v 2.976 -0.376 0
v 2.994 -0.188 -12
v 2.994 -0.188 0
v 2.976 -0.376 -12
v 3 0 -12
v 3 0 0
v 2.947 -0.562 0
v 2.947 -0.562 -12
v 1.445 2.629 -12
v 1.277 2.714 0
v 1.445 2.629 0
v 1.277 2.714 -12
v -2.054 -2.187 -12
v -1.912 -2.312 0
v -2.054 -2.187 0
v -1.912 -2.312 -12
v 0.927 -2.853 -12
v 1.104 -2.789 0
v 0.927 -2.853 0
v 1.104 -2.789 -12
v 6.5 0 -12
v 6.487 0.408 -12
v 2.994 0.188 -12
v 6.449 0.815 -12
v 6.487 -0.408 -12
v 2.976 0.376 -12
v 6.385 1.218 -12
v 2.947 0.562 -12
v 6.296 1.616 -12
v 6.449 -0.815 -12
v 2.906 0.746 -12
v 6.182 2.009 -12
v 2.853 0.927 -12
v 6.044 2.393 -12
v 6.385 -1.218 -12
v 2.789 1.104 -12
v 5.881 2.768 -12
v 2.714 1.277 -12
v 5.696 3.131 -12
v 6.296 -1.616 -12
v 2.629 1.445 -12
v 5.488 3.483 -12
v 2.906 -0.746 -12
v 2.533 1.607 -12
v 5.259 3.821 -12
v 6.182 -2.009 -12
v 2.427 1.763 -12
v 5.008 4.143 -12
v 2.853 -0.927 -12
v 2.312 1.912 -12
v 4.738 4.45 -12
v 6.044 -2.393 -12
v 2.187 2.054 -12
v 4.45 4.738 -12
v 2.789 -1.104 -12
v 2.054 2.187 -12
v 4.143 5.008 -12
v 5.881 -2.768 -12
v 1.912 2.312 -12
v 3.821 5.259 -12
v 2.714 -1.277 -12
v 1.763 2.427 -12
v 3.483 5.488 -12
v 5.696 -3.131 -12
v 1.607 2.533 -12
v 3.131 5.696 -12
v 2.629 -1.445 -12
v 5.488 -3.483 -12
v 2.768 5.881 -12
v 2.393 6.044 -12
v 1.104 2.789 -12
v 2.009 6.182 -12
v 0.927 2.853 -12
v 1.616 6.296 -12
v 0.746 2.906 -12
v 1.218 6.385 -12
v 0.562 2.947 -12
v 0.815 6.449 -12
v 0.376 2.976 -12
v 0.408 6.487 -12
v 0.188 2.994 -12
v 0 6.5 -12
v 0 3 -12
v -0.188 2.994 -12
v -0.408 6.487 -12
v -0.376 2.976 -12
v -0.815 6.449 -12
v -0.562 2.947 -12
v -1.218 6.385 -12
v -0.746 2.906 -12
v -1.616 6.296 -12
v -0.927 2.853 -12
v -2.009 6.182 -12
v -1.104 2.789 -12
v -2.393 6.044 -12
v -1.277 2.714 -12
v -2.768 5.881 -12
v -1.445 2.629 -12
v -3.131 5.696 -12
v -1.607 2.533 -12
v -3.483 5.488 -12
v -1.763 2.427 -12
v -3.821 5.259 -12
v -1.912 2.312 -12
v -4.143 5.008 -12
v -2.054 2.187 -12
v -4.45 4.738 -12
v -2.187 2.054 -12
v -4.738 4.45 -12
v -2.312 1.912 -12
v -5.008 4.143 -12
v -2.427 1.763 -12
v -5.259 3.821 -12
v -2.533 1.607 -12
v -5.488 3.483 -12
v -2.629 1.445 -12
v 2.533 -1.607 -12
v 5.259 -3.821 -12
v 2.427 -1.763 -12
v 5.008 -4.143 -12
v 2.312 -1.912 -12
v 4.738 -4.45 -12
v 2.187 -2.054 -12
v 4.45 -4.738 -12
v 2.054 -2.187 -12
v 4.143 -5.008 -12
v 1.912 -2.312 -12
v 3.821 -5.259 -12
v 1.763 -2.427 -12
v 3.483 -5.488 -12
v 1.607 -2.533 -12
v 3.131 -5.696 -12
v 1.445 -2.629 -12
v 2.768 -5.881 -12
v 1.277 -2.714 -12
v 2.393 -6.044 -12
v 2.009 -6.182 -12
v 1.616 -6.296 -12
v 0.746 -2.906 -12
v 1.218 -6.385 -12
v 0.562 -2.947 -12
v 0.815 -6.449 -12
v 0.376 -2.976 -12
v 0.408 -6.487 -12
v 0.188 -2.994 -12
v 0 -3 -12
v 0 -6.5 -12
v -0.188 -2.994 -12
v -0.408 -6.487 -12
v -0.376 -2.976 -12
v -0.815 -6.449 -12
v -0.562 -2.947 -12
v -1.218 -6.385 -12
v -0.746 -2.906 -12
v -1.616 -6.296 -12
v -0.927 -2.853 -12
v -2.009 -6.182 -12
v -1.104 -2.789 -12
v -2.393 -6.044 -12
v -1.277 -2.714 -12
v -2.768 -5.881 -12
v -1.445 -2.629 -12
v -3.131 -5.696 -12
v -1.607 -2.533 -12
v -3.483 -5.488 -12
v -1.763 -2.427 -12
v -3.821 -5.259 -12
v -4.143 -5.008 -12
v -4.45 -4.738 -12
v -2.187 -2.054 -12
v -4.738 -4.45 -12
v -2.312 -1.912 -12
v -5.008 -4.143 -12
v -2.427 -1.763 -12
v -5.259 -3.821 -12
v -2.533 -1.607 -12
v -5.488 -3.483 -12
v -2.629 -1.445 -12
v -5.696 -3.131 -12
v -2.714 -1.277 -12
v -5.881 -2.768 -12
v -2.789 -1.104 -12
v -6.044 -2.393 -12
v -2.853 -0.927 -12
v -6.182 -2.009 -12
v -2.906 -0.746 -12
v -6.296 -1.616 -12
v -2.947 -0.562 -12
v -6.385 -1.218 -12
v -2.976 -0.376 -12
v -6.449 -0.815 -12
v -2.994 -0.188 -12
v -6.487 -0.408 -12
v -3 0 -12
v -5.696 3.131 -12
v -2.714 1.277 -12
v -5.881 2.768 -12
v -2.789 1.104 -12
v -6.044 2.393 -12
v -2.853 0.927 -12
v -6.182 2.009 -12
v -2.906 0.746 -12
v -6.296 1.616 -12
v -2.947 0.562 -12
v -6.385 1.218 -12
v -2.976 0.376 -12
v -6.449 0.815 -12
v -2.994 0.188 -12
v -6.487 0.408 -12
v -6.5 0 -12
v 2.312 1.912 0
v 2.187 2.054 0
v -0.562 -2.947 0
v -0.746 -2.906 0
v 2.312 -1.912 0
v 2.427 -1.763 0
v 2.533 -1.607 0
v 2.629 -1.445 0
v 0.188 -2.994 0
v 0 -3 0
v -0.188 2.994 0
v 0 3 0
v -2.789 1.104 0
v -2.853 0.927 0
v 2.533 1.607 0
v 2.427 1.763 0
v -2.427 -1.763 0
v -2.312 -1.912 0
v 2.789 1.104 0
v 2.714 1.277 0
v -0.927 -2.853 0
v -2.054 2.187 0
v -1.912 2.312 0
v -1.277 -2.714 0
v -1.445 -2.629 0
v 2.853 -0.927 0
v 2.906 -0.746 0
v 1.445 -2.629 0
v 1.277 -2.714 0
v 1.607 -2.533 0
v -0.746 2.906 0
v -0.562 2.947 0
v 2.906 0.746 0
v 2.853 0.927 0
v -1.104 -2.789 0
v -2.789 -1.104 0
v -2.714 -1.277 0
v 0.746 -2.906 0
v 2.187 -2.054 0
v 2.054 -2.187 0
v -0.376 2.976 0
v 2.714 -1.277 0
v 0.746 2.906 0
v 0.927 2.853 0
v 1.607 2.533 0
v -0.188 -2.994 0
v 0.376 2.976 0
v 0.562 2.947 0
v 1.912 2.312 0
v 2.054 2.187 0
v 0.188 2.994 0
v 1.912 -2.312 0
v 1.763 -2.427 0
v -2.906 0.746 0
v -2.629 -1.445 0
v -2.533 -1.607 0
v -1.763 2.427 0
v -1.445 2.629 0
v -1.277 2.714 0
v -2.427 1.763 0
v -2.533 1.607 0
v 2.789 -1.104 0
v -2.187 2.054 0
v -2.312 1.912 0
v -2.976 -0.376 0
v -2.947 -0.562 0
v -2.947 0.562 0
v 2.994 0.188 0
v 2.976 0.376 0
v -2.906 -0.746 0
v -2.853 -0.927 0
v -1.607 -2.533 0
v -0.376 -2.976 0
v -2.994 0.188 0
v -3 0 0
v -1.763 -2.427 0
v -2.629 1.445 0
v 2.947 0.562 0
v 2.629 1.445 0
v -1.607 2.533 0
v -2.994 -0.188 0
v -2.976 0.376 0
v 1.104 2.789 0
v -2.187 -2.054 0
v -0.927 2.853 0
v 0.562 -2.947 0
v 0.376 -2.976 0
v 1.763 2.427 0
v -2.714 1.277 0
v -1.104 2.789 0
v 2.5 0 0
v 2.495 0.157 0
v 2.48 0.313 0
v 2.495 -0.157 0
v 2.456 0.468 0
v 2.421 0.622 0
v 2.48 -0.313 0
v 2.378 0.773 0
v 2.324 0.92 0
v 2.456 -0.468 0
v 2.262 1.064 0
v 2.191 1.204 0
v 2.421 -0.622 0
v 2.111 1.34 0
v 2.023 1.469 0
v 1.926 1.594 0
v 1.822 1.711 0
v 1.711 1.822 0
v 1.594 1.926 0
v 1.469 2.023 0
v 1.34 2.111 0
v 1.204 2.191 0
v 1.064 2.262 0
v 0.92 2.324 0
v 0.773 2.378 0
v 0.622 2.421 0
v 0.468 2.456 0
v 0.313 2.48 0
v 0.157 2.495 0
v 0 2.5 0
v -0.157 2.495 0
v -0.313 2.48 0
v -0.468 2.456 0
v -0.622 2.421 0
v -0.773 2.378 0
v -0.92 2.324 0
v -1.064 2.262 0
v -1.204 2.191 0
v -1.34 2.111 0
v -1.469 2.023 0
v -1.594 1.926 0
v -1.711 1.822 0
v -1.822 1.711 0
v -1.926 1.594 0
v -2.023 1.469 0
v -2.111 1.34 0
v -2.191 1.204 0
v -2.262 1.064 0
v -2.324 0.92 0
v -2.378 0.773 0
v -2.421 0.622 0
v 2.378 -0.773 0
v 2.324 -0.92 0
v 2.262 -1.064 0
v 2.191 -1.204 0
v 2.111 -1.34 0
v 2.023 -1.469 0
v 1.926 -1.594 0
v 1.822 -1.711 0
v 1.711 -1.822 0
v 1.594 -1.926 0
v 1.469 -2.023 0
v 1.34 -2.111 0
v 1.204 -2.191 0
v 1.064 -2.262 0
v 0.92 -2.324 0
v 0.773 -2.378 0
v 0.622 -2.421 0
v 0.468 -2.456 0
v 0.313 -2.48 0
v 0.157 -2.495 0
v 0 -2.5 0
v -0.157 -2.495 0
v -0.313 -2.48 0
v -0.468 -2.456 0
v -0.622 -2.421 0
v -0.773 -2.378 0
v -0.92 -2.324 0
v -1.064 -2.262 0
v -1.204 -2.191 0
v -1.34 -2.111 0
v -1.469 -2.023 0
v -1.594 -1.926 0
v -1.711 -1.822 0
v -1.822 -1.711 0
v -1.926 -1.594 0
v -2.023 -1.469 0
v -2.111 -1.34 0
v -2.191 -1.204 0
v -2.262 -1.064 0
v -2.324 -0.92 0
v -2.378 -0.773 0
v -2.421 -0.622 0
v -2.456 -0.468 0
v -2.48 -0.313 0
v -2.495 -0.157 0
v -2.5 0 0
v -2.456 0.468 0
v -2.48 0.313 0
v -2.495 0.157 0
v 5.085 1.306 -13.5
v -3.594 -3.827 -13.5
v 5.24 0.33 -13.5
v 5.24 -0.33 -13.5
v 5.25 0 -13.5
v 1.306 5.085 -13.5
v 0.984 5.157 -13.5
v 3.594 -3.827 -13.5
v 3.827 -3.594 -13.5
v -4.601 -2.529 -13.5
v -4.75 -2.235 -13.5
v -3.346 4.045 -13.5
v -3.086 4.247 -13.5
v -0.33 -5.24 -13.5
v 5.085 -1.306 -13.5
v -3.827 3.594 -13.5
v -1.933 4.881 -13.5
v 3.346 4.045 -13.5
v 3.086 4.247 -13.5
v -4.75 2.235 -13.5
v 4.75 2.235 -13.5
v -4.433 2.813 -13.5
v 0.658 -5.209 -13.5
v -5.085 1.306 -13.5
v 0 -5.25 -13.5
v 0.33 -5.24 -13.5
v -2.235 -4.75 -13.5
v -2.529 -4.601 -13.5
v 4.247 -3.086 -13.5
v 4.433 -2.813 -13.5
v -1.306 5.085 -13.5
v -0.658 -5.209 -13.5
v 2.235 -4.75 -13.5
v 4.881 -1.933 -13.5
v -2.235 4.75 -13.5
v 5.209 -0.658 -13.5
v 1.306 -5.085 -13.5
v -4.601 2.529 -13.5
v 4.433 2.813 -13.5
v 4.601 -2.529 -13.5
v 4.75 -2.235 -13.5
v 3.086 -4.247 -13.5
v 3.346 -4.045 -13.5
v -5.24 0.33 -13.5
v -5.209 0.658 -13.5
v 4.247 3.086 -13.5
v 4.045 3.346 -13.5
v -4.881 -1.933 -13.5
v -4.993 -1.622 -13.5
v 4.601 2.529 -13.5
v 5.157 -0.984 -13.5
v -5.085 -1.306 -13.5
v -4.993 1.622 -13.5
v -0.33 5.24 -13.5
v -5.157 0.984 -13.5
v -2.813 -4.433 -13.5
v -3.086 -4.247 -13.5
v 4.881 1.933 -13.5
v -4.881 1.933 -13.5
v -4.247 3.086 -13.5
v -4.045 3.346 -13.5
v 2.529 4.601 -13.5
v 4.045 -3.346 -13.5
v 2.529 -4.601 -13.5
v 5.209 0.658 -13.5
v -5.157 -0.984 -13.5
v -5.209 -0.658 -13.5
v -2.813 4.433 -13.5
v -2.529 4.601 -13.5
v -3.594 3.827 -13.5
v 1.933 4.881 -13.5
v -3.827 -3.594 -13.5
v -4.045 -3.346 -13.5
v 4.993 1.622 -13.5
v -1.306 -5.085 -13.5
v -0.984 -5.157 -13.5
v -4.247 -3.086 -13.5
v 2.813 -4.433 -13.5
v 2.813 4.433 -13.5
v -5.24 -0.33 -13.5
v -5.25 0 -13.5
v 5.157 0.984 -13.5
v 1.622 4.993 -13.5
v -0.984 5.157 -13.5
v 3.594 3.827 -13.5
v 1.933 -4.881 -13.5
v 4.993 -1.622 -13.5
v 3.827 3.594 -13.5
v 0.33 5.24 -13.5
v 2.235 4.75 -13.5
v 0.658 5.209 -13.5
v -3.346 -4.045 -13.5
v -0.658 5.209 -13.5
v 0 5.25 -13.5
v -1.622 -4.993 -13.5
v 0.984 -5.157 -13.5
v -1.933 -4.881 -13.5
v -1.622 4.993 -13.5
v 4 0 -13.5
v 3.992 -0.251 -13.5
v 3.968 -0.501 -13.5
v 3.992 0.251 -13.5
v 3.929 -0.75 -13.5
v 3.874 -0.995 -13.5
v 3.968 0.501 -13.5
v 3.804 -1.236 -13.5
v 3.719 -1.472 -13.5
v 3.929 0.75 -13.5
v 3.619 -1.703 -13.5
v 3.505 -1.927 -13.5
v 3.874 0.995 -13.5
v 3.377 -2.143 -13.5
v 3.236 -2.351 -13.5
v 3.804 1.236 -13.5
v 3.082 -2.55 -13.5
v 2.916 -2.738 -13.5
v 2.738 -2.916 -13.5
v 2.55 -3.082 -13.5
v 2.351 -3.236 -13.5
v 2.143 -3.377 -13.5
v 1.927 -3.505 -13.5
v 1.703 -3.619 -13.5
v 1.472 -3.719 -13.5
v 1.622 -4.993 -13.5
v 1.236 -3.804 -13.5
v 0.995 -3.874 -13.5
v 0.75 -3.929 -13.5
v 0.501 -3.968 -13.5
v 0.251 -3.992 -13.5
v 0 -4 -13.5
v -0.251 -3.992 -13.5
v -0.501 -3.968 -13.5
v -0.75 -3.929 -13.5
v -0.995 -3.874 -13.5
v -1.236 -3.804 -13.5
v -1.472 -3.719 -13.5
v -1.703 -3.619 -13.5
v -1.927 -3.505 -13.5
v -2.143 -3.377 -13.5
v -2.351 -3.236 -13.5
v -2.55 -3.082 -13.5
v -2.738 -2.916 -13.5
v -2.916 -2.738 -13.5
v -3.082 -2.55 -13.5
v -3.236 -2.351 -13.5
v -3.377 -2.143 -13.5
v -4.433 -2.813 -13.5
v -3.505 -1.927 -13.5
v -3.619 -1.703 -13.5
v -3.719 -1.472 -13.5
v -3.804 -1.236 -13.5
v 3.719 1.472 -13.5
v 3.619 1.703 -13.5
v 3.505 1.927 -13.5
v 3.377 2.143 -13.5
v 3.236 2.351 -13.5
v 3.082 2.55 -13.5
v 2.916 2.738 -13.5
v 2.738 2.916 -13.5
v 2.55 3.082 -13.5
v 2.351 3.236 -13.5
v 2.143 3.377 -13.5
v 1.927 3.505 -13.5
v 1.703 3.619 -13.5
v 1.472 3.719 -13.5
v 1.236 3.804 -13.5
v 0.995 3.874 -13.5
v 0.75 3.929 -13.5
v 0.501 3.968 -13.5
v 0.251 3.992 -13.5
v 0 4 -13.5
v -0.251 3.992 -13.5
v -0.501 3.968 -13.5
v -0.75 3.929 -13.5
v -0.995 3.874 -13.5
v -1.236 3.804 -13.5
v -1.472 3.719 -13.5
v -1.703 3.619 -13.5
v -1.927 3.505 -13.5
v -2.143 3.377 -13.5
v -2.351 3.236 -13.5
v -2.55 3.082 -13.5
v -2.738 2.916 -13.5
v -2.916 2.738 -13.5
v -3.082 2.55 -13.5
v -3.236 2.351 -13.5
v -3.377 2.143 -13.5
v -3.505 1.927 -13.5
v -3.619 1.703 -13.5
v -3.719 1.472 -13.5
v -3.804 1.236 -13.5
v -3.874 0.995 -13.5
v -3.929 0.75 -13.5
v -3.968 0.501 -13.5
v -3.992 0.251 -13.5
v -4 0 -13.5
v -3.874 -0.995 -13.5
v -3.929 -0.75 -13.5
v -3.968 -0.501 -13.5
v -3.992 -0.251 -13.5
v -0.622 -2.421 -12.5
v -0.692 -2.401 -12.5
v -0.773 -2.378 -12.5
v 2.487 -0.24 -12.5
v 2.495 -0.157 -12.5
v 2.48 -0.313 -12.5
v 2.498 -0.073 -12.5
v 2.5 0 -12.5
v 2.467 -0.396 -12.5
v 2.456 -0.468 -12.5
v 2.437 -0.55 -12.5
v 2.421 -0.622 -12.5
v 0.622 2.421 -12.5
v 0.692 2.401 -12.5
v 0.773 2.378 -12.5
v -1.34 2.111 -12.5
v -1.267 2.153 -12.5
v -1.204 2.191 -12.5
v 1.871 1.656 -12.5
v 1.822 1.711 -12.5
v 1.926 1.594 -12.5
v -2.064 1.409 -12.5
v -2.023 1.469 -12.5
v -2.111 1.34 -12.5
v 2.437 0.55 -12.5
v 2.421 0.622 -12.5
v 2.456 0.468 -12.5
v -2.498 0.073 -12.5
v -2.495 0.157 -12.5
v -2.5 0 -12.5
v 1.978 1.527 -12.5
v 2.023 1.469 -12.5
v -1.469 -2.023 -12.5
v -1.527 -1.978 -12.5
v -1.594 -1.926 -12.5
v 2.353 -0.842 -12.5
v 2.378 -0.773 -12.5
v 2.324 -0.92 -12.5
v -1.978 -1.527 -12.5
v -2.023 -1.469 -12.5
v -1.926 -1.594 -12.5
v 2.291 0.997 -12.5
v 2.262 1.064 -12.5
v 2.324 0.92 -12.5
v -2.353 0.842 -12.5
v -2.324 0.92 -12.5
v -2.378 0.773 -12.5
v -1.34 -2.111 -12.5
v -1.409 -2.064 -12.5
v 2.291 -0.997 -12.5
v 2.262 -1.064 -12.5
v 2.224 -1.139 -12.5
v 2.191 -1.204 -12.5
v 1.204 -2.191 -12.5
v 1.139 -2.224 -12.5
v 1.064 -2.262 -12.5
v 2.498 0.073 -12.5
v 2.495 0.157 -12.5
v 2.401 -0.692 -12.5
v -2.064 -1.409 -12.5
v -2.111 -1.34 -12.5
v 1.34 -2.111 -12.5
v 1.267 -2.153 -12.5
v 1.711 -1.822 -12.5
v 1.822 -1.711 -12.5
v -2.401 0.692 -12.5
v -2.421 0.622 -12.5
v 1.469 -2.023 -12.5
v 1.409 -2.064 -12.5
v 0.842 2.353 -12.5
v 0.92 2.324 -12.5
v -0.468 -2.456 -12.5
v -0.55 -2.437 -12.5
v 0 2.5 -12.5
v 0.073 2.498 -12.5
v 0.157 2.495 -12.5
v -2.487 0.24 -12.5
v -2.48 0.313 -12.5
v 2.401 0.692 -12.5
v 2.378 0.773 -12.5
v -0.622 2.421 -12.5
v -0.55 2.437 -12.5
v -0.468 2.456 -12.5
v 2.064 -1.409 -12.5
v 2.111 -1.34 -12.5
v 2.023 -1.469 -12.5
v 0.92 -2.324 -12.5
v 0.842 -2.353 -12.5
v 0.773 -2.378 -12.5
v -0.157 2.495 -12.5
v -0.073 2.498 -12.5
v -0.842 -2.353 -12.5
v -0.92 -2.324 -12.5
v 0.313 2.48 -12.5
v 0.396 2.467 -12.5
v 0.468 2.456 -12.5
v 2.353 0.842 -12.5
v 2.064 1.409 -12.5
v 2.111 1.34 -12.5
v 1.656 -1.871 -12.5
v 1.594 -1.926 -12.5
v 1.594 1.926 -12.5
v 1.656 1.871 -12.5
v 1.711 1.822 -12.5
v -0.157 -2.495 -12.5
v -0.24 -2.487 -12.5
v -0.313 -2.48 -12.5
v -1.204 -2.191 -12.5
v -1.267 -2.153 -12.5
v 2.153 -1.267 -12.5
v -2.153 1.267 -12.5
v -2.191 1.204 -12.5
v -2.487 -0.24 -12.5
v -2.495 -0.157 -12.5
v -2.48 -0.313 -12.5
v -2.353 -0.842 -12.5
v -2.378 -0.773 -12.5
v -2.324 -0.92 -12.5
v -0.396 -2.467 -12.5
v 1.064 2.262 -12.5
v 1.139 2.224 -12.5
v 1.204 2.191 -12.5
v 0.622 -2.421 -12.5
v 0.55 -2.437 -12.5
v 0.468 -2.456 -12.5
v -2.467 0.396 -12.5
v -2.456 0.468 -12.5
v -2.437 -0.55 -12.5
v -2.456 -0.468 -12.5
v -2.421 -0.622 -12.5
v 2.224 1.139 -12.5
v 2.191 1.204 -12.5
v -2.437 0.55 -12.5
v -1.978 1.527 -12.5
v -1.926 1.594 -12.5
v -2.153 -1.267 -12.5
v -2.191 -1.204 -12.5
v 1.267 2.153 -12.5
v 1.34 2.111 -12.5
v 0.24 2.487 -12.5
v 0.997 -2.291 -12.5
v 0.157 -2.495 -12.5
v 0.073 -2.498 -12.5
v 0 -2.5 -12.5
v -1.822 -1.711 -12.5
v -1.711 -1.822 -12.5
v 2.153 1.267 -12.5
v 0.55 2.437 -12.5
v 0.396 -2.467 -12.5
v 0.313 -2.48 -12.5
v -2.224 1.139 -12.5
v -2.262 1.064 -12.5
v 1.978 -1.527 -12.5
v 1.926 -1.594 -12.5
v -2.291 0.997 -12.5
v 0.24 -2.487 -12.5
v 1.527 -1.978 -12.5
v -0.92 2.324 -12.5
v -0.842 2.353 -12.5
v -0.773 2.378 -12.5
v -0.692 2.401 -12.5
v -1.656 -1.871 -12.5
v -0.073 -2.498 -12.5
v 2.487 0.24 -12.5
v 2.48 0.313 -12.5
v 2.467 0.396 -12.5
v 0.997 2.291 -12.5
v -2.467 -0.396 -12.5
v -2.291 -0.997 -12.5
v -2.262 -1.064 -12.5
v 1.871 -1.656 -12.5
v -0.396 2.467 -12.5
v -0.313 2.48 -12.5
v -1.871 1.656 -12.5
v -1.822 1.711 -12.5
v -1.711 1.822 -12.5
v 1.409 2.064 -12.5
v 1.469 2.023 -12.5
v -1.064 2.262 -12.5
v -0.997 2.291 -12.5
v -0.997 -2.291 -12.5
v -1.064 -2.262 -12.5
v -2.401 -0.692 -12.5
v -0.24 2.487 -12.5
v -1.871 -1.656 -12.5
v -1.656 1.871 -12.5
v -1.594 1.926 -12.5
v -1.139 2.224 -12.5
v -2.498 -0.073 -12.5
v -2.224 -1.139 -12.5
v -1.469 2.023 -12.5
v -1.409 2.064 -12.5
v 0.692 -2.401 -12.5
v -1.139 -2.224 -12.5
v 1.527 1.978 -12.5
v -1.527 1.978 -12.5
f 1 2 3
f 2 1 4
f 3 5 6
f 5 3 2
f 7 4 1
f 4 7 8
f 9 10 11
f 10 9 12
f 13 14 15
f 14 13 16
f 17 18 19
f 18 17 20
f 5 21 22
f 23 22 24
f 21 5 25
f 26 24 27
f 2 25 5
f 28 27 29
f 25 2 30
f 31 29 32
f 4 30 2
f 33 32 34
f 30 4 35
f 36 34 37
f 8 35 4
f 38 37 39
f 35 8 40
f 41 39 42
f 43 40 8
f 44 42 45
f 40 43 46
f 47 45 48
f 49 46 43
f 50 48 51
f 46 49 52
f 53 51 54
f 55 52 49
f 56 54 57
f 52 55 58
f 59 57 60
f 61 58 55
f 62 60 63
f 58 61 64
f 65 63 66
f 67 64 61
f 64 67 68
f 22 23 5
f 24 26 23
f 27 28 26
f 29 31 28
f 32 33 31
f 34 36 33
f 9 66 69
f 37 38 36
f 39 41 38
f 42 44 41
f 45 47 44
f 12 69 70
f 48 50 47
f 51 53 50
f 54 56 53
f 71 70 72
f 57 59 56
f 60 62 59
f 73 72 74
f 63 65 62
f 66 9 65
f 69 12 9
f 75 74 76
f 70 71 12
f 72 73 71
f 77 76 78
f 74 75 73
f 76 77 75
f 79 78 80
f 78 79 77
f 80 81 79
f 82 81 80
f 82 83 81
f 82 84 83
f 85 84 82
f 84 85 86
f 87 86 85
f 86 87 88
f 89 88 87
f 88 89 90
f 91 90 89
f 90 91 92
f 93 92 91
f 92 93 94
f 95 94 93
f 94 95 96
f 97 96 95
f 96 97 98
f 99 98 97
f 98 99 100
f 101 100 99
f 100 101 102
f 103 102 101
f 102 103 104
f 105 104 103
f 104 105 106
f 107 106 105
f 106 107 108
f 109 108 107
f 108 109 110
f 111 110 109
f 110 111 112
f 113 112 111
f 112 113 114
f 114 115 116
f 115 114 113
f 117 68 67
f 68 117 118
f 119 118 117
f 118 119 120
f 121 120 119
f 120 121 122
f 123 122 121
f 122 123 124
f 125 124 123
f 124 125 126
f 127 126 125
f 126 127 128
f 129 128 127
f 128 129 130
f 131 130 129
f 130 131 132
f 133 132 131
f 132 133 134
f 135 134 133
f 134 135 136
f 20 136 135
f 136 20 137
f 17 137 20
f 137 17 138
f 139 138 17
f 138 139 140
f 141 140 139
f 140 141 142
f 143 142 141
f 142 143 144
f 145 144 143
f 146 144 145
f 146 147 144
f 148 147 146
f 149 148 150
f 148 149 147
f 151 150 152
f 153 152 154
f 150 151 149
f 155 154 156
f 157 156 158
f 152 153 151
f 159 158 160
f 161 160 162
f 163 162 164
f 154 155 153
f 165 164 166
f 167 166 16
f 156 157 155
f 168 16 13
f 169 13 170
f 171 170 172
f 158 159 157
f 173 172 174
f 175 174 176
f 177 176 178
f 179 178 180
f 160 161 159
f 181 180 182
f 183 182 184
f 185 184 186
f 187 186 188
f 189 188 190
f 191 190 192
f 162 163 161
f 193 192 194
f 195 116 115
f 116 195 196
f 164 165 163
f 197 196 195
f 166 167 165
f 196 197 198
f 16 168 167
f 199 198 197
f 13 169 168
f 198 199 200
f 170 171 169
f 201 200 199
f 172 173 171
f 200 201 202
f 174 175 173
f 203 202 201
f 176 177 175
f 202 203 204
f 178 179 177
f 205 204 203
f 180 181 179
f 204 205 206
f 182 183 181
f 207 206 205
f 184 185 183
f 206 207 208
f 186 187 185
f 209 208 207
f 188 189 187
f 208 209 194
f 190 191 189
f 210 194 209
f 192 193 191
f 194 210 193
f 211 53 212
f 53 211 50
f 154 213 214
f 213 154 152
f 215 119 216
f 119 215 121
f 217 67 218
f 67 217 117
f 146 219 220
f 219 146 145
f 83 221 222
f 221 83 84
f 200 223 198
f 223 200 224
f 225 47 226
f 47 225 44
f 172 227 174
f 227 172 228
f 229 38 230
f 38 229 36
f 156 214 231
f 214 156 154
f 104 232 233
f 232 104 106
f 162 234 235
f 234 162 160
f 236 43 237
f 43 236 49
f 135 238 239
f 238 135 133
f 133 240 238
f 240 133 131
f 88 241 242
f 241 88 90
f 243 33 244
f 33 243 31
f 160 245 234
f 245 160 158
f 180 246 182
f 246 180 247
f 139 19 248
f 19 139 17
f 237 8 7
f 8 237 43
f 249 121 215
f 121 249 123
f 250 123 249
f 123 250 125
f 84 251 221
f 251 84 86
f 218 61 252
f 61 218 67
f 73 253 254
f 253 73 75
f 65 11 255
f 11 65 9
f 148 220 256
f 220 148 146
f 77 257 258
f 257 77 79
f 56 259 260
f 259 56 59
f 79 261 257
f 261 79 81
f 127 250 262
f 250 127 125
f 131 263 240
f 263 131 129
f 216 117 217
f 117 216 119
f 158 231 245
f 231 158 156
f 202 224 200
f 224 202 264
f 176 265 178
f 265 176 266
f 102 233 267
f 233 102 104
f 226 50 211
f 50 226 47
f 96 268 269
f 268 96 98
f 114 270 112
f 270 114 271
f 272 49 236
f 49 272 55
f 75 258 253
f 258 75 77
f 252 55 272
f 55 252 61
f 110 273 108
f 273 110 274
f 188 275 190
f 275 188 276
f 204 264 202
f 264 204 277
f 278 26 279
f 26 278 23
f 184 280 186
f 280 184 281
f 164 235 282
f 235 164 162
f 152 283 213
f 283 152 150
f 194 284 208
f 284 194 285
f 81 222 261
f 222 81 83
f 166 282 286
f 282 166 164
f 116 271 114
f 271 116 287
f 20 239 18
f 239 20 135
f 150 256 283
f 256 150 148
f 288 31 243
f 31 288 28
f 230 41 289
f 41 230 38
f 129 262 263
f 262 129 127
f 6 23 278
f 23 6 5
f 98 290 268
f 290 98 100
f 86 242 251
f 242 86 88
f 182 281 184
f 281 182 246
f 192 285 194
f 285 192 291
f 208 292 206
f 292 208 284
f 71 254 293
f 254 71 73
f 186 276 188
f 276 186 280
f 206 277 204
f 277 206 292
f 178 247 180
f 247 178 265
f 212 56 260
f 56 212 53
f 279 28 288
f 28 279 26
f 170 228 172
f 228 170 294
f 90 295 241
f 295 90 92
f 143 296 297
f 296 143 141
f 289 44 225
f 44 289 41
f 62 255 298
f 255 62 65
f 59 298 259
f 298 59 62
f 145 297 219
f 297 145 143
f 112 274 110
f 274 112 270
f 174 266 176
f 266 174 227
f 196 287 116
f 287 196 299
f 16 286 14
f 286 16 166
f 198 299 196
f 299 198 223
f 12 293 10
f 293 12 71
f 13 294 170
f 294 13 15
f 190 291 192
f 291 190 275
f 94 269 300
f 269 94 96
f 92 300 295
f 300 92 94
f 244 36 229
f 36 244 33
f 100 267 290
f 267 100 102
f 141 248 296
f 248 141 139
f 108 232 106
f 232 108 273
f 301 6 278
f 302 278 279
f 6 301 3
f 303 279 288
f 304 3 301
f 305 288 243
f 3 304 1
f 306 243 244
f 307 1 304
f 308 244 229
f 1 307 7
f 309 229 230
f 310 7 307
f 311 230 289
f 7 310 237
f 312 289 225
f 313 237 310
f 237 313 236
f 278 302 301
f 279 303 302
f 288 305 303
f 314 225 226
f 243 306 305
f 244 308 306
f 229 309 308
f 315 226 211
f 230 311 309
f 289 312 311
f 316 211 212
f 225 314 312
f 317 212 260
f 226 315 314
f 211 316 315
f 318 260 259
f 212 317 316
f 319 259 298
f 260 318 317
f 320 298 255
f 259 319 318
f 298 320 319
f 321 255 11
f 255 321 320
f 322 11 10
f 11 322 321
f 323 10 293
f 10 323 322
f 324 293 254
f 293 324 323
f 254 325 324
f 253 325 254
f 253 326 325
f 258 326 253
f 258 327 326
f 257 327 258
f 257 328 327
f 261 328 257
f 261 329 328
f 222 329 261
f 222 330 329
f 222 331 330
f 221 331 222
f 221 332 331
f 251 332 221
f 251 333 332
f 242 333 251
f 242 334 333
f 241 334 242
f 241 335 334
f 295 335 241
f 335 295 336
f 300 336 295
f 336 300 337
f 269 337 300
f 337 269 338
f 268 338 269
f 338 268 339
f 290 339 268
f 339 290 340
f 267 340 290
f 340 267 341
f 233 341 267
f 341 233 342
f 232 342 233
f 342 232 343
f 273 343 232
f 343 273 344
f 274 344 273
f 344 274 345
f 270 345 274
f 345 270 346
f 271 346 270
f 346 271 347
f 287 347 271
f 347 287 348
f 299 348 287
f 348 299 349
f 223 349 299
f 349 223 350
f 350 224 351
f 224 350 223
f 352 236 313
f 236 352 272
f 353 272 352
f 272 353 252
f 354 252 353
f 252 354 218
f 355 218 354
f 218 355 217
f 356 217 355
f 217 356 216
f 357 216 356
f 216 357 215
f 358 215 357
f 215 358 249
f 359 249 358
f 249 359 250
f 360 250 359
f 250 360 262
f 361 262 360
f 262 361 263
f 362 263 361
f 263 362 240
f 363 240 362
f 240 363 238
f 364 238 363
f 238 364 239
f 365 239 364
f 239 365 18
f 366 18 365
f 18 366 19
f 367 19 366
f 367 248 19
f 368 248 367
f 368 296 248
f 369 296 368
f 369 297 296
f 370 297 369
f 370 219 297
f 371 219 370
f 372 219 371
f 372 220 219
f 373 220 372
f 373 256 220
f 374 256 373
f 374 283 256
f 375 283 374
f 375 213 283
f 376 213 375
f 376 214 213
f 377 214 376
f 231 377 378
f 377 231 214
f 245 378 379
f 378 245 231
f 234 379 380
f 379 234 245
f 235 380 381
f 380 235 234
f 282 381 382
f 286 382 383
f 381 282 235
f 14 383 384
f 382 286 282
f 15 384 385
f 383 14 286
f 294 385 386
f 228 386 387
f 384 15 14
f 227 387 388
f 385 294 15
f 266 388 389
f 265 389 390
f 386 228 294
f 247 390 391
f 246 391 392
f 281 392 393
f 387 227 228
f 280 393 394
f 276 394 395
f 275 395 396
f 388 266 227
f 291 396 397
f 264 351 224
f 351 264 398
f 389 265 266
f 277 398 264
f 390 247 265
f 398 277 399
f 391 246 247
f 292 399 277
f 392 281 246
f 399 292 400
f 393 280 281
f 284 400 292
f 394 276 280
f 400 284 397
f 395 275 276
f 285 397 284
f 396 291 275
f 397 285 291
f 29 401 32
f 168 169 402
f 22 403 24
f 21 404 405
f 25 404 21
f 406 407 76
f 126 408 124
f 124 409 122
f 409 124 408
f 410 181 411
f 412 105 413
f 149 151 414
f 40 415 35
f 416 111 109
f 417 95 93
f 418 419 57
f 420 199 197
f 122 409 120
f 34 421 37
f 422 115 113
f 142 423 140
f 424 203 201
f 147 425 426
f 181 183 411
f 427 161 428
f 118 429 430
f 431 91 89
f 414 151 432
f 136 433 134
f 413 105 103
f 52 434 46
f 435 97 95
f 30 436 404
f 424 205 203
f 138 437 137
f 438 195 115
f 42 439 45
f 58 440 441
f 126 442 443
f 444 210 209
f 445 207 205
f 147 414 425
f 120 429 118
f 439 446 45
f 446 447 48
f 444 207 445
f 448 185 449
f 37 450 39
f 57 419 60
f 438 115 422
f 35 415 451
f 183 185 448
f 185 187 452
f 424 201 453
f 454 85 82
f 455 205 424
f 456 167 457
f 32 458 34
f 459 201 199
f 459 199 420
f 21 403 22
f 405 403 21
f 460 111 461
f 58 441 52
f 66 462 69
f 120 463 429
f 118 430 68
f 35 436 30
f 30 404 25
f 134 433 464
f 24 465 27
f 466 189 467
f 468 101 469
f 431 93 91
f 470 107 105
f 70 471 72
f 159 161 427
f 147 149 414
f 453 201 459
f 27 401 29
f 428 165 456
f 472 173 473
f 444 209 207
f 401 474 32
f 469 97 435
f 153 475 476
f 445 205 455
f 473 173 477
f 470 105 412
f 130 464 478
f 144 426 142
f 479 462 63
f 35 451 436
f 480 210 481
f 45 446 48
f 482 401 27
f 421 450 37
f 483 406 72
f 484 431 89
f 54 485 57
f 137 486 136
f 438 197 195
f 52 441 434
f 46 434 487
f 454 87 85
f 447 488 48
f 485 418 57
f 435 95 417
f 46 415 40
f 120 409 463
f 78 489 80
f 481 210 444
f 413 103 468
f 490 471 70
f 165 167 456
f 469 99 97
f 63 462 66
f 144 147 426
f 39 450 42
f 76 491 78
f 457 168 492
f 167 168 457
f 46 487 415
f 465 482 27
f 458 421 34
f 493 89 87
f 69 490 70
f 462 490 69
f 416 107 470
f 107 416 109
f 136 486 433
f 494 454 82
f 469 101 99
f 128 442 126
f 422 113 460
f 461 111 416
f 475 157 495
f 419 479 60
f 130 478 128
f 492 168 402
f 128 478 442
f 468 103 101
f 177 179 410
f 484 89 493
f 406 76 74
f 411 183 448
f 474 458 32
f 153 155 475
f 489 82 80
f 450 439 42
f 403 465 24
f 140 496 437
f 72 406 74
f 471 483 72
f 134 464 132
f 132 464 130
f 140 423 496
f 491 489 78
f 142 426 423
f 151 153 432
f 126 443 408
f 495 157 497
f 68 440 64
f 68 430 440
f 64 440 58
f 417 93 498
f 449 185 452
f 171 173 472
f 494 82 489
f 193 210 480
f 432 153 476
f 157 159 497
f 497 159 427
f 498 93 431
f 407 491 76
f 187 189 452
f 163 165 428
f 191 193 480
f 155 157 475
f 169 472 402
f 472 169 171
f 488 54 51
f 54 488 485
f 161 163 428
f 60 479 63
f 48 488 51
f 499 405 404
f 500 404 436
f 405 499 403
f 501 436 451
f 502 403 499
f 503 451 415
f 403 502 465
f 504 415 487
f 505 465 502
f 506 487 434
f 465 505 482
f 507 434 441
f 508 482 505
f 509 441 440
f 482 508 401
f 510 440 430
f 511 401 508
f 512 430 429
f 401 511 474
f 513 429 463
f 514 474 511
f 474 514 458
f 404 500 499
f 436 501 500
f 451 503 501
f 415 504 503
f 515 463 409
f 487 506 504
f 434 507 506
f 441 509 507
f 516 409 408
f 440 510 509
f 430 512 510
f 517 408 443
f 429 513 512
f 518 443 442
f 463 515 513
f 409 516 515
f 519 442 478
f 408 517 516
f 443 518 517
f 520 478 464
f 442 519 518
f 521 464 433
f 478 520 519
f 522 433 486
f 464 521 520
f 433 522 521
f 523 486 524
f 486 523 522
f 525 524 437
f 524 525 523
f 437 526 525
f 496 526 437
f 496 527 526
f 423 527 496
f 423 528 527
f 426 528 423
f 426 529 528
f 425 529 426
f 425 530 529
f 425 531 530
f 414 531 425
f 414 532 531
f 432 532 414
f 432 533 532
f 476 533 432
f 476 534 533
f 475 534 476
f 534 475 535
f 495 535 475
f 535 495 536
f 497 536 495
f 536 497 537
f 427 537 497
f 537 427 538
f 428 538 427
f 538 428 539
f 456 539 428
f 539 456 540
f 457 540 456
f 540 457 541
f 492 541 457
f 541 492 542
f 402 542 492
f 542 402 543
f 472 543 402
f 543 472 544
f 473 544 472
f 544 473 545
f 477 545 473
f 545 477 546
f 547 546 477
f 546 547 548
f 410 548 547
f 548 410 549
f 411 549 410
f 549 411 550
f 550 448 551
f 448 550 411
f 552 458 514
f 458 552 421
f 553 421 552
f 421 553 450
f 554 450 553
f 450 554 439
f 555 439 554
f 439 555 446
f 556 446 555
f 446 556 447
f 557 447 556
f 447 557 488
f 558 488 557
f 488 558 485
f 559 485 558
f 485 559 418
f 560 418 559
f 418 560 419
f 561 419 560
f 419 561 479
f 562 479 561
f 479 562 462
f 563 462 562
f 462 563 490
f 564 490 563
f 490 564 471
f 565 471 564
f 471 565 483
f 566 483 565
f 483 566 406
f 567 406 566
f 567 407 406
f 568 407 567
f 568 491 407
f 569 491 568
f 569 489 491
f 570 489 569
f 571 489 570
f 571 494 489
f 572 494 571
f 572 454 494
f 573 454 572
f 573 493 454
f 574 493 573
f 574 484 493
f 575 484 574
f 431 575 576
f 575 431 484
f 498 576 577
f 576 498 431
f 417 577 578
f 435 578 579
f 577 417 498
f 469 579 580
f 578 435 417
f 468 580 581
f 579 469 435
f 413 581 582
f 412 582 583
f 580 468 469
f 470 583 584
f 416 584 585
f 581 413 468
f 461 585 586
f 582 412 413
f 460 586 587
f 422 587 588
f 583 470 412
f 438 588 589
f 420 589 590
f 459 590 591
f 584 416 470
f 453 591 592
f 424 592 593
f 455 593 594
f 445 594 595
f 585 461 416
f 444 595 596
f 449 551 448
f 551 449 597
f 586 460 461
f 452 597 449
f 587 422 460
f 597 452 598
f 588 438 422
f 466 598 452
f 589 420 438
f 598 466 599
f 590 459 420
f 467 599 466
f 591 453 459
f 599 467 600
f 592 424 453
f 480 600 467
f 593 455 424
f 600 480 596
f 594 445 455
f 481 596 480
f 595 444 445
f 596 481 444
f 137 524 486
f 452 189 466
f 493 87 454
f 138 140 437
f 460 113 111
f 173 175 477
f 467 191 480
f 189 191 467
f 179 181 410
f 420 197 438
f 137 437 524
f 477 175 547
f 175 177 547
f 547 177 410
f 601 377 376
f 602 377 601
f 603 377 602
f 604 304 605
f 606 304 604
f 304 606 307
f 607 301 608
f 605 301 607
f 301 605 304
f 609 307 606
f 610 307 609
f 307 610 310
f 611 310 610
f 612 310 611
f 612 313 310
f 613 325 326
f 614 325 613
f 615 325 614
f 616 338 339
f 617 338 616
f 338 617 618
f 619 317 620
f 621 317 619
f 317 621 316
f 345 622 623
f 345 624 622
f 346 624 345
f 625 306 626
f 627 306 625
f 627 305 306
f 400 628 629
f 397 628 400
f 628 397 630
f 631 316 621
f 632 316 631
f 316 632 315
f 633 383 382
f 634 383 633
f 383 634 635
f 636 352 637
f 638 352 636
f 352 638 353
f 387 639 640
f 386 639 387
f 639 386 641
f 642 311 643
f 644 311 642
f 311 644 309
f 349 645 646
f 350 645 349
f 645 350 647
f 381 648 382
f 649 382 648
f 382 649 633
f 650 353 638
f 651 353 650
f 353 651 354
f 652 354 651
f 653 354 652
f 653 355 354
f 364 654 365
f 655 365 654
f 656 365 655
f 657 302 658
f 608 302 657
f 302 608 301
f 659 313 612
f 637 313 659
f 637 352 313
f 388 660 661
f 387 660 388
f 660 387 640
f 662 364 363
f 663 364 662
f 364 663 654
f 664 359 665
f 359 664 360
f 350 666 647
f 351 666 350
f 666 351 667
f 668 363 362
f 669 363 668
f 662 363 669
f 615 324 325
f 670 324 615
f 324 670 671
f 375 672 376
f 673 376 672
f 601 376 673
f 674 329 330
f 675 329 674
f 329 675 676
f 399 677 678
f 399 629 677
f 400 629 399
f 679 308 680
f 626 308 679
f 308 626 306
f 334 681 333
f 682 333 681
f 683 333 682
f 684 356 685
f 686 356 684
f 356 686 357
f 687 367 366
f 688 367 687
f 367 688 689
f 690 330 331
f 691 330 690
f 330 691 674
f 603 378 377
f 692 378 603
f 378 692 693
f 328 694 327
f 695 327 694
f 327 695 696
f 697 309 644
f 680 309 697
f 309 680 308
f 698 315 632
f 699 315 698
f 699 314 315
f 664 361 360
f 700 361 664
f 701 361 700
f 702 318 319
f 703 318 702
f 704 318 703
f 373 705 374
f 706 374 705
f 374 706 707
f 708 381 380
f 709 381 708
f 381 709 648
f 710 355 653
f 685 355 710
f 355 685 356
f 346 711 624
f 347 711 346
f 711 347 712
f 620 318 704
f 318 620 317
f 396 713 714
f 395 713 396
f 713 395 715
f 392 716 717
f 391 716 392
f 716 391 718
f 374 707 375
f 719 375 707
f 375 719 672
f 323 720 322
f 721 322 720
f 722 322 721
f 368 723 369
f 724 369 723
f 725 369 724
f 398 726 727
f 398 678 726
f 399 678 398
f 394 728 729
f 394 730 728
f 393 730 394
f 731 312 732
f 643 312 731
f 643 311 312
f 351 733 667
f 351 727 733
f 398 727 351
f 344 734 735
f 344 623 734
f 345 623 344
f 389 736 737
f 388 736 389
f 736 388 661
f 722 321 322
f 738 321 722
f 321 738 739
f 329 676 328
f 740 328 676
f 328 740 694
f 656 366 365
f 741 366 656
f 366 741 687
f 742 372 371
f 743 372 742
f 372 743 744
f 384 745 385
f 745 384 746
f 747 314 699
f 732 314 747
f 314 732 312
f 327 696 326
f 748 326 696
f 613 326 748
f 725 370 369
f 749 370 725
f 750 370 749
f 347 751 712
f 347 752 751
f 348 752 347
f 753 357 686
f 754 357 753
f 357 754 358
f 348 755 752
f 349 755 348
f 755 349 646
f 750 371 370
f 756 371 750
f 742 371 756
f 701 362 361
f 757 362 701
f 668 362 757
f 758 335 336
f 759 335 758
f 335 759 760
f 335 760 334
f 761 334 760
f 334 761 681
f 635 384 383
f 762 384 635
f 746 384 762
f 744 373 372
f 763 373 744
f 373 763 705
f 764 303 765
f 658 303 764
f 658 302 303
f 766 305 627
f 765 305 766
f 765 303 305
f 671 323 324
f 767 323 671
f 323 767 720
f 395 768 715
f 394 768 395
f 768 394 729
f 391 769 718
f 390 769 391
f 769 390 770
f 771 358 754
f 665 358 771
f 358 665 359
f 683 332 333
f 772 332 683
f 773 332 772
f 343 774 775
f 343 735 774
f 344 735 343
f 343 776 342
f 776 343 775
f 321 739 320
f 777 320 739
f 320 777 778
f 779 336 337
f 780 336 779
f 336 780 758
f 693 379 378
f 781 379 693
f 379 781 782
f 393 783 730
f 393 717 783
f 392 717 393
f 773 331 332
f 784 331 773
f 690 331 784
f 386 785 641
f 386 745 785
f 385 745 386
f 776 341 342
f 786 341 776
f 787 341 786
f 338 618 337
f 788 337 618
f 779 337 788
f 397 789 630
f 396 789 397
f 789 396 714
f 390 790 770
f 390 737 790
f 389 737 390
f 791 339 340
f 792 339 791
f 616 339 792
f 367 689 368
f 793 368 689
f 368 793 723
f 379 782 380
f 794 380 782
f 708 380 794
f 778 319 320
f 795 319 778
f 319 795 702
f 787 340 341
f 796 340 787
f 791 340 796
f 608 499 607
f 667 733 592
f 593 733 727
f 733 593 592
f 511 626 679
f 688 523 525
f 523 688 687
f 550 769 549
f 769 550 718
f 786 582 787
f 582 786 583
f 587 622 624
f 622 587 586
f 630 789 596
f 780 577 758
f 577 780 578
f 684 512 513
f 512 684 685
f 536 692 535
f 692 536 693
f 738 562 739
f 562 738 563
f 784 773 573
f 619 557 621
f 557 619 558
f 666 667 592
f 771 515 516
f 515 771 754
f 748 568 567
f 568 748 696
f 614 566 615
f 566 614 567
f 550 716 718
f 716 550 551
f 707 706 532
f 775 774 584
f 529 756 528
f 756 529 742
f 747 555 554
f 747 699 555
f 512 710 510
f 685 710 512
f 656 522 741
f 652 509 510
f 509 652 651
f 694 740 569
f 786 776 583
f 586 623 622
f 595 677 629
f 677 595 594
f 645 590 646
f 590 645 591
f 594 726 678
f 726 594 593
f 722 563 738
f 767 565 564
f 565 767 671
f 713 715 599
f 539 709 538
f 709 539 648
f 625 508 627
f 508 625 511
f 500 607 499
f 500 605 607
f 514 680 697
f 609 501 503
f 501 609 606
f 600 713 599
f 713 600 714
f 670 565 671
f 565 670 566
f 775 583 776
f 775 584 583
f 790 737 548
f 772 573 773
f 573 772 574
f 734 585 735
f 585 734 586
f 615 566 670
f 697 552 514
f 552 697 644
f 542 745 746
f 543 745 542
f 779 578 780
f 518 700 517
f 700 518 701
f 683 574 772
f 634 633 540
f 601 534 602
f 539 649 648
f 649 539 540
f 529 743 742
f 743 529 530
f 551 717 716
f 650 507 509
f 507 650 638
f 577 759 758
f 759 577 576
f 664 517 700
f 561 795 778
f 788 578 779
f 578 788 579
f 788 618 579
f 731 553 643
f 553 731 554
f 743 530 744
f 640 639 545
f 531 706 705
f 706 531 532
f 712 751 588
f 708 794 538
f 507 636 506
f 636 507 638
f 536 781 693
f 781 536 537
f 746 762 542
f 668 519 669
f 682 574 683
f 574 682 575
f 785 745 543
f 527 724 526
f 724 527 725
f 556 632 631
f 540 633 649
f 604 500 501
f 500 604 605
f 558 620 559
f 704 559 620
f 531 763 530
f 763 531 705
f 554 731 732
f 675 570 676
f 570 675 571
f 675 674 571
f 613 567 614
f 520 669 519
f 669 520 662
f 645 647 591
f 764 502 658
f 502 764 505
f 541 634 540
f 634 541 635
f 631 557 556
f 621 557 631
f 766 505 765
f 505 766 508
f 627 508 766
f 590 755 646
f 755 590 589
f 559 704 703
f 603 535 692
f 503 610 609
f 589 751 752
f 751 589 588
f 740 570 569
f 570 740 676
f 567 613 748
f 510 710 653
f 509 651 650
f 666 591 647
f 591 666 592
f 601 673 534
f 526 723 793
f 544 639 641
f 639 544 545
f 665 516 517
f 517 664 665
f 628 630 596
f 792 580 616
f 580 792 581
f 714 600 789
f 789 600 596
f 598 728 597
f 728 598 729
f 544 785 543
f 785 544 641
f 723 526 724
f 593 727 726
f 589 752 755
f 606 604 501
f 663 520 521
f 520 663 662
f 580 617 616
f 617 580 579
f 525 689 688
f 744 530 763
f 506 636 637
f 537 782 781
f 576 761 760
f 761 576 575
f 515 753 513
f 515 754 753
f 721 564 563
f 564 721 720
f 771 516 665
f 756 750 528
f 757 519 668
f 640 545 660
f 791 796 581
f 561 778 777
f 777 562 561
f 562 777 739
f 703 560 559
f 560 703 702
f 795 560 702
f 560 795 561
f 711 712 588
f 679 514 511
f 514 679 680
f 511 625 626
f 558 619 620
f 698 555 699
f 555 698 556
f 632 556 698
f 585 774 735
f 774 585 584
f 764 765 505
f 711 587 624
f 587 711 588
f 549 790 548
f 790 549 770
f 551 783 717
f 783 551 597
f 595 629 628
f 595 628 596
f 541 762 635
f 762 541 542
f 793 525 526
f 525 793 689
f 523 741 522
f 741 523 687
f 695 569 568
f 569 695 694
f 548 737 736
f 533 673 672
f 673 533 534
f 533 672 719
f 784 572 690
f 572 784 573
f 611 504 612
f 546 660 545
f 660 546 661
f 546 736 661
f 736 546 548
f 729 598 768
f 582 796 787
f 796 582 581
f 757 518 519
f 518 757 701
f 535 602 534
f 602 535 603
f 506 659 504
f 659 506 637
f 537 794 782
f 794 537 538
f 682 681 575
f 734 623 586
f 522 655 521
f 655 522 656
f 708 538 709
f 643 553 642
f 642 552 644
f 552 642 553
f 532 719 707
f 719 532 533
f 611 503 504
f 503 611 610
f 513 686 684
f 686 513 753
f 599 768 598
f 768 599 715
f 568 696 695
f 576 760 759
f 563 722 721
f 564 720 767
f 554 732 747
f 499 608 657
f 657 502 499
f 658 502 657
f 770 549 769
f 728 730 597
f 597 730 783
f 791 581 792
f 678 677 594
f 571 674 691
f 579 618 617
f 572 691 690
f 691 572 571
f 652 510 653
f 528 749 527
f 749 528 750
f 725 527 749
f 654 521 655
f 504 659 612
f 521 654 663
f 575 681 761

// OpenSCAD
rotate([180,0,0]){difference(){
    union(){
        cylinder(12,6/2,6/2, $fn = 100);
        translate([0,0,12])
            cylinder(1.5,13/2,10.5/2, $fn = 100);
    }
    cylinder(15,5/2,5/2, $fn = 100);
    translate([0,0,12])
        cylinder(1.5,3.5/2,8/2, $fn = 100);
}}
